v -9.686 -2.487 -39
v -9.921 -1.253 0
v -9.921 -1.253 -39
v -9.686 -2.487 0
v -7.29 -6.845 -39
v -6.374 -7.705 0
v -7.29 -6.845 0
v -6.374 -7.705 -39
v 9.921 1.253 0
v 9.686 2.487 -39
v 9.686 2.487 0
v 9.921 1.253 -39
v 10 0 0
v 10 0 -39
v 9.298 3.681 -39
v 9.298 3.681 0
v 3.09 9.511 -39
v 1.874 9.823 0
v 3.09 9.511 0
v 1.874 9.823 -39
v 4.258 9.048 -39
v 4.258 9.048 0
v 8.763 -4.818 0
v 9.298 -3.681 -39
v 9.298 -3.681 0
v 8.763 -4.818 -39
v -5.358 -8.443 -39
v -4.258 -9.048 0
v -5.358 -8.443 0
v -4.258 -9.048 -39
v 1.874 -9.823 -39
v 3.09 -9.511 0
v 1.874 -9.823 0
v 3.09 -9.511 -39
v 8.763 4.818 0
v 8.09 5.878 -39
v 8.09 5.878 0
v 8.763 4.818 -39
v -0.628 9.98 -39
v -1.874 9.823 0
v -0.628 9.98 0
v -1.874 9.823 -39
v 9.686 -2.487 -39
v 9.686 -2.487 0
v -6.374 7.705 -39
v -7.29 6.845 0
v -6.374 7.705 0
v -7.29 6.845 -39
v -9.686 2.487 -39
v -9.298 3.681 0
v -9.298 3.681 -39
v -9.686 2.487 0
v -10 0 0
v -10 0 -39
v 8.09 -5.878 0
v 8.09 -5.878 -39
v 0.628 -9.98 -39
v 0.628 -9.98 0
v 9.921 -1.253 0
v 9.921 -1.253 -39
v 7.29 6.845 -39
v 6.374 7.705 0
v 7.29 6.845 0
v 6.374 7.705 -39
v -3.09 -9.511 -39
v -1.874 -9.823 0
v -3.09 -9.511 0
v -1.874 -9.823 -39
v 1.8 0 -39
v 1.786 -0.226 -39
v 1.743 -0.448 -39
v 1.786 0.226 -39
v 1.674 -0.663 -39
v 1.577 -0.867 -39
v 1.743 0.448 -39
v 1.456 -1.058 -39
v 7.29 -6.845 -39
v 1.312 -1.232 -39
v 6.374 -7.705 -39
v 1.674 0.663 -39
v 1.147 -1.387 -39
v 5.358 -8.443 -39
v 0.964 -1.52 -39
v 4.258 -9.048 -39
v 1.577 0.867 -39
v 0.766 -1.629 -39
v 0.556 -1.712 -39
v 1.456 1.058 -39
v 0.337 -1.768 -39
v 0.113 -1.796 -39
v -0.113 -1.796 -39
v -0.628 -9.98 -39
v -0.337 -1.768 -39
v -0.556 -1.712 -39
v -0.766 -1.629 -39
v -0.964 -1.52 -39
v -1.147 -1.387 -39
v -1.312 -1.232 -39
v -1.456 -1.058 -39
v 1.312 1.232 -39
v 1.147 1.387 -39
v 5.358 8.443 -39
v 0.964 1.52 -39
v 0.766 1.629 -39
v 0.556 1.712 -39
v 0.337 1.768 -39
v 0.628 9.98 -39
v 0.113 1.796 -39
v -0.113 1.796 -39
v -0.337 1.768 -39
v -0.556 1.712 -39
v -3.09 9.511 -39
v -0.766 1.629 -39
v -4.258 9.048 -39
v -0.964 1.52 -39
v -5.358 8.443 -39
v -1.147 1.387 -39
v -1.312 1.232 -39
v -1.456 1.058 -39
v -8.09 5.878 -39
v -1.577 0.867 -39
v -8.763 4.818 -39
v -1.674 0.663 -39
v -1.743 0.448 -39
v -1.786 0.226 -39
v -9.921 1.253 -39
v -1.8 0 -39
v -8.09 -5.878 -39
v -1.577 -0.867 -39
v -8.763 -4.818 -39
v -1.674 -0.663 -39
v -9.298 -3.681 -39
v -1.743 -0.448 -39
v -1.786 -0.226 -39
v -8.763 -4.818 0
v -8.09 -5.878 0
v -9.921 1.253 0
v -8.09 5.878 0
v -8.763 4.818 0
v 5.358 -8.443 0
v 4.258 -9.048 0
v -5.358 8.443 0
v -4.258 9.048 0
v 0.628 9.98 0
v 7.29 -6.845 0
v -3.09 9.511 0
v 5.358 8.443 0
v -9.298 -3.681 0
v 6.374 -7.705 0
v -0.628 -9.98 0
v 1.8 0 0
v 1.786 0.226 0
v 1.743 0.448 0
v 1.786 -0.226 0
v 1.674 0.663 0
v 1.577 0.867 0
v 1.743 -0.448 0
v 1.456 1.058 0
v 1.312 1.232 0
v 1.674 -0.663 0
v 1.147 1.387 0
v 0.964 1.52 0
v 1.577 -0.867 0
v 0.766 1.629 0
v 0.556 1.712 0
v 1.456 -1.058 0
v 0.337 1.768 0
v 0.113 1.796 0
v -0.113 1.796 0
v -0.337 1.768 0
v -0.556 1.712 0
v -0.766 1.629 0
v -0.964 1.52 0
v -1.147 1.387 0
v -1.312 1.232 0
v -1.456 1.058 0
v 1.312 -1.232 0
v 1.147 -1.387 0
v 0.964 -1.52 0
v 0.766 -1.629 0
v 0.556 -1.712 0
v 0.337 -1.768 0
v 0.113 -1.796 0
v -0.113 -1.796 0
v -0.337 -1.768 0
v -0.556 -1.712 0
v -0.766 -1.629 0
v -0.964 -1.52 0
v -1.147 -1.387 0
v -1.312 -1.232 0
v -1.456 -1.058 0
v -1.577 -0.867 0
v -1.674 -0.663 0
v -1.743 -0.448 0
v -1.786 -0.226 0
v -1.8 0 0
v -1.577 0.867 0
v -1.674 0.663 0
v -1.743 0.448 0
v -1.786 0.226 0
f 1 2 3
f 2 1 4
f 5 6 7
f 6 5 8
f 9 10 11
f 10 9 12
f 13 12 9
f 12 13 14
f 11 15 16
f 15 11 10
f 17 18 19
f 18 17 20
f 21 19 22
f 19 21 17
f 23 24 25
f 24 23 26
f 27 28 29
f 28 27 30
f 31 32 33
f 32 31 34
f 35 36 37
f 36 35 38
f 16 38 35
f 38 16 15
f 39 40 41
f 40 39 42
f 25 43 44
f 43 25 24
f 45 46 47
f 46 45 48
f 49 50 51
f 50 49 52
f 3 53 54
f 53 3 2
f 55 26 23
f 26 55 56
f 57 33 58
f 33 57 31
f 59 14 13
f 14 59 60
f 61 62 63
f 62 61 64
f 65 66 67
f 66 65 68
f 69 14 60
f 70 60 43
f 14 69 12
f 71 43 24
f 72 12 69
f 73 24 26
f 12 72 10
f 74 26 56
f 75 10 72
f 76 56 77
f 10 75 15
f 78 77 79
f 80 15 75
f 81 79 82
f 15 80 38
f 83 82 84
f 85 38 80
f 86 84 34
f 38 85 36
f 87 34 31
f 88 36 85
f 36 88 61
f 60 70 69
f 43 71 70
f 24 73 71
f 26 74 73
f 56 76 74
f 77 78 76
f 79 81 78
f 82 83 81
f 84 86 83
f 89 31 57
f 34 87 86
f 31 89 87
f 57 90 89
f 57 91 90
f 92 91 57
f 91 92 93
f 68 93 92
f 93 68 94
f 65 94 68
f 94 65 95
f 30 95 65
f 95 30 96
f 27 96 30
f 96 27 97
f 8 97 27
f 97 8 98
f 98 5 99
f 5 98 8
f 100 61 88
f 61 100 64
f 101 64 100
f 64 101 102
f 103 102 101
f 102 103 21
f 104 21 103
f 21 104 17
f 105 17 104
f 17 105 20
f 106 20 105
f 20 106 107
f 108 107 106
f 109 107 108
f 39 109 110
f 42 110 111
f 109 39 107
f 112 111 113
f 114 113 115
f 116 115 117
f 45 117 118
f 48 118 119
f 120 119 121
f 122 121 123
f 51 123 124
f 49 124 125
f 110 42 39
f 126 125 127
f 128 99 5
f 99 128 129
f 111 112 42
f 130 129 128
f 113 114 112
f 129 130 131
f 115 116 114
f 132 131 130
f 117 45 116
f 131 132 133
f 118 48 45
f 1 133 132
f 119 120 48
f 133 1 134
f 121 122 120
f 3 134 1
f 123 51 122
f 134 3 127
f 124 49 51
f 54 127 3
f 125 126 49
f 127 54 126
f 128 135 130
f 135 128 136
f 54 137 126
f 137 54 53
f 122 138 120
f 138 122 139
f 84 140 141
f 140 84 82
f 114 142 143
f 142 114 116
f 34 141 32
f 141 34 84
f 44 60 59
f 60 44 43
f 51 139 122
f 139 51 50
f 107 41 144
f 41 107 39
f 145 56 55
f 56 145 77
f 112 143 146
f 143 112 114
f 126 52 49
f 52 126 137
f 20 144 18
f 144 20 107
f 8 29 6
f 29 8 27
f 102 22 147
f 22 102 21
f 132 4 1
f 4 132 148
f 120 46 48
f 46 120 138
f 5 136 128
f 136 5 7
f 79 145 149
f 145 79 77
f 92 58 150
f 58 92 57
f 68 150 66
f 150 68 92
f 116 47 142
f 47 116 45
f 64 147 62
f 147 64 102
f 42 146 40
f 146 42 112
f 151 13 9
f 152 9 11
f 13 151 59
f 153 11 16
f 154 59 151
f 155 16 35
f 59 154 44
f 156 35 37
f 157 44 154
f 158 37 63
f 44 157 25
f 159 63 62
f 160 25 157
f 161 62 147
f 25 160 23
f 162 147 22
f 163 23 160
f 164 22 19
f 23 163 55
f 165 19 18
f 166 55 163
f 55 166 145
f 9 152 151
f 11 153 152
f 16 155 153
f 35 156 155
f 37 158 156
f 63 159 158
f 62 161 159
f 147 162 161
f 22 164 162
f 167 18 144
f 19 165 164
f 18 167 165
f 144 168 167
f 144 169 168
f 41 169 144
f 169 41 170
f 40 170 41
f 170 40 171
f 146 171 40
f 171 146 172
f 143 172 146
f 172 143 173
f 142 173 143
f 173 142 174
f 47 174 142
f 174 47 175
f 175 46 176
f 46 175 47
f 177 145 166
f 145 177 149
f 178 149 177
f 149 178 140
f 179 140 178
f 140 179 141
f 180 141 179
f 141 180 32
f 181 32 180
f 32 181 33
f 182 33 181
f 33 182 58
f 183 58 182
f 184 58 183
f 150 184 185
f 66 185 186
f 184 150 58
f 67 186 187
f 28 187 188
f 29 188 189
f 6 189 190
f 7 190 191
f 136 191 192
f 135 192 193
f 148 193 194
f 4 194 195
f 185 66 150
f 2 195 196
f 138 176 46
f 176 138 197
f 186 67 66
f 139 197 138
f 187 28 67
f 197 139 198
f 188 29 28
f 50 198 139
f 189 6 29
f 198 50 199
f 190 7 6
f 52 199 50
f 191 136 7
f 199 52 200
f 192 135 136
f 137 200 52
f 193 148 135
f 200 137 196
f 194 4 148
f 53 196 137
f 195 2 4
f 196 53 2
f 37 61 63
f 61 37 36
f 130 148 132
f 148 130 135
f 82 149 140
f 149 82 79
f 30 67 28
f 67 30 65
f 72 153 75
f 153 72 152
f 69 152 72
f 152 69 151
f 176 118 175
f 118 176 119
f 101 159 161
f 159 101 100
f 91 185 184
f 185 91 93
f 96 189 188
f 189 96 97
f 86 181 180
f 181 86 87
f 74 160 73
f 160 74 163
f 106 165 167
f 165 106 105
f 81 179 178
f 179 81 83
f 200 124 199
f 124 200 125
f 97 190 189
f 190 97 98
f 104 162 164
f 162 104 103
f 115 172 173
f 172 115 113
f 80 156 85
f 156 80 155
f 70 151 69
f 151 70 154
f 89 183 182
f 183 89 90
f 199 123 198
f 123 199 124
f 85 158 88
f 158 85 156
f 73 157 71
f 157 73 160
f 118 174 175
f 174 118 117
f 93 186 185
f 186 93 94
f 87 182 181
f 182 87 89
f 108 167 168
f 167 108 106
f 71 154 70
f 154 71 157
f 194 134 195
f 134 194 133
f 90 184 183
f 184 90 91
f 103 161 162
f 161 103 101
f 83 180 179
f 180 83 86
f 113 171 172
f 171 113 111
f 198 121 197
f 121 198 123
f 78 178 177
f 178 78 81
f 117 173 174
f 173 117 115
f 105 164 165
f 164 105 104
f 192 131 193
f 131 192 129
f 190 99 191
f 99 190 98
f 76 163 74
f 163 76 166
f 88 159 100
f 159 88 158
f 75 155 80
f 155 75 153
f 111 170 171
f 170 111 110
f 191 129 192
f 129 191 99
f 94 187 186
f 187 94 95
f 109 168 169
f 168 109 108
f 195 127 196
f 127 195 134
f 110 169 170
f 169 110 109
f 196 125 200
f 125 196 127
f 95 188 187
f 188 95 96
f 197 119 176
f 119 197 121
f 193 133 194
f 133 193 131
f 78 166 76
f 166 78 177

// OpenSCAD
$fn = 50;


difference() {
	union() {
		translate(v = [0, 0, -39.0000000000]) {
			cylinder(h = 39, r = 10.0000000000);
		}
	}
	union() {
		#translate(v = [0, 0, -39]) {
			cylinder(h = 39, r = 1.8000000000);
		}
	}
}
